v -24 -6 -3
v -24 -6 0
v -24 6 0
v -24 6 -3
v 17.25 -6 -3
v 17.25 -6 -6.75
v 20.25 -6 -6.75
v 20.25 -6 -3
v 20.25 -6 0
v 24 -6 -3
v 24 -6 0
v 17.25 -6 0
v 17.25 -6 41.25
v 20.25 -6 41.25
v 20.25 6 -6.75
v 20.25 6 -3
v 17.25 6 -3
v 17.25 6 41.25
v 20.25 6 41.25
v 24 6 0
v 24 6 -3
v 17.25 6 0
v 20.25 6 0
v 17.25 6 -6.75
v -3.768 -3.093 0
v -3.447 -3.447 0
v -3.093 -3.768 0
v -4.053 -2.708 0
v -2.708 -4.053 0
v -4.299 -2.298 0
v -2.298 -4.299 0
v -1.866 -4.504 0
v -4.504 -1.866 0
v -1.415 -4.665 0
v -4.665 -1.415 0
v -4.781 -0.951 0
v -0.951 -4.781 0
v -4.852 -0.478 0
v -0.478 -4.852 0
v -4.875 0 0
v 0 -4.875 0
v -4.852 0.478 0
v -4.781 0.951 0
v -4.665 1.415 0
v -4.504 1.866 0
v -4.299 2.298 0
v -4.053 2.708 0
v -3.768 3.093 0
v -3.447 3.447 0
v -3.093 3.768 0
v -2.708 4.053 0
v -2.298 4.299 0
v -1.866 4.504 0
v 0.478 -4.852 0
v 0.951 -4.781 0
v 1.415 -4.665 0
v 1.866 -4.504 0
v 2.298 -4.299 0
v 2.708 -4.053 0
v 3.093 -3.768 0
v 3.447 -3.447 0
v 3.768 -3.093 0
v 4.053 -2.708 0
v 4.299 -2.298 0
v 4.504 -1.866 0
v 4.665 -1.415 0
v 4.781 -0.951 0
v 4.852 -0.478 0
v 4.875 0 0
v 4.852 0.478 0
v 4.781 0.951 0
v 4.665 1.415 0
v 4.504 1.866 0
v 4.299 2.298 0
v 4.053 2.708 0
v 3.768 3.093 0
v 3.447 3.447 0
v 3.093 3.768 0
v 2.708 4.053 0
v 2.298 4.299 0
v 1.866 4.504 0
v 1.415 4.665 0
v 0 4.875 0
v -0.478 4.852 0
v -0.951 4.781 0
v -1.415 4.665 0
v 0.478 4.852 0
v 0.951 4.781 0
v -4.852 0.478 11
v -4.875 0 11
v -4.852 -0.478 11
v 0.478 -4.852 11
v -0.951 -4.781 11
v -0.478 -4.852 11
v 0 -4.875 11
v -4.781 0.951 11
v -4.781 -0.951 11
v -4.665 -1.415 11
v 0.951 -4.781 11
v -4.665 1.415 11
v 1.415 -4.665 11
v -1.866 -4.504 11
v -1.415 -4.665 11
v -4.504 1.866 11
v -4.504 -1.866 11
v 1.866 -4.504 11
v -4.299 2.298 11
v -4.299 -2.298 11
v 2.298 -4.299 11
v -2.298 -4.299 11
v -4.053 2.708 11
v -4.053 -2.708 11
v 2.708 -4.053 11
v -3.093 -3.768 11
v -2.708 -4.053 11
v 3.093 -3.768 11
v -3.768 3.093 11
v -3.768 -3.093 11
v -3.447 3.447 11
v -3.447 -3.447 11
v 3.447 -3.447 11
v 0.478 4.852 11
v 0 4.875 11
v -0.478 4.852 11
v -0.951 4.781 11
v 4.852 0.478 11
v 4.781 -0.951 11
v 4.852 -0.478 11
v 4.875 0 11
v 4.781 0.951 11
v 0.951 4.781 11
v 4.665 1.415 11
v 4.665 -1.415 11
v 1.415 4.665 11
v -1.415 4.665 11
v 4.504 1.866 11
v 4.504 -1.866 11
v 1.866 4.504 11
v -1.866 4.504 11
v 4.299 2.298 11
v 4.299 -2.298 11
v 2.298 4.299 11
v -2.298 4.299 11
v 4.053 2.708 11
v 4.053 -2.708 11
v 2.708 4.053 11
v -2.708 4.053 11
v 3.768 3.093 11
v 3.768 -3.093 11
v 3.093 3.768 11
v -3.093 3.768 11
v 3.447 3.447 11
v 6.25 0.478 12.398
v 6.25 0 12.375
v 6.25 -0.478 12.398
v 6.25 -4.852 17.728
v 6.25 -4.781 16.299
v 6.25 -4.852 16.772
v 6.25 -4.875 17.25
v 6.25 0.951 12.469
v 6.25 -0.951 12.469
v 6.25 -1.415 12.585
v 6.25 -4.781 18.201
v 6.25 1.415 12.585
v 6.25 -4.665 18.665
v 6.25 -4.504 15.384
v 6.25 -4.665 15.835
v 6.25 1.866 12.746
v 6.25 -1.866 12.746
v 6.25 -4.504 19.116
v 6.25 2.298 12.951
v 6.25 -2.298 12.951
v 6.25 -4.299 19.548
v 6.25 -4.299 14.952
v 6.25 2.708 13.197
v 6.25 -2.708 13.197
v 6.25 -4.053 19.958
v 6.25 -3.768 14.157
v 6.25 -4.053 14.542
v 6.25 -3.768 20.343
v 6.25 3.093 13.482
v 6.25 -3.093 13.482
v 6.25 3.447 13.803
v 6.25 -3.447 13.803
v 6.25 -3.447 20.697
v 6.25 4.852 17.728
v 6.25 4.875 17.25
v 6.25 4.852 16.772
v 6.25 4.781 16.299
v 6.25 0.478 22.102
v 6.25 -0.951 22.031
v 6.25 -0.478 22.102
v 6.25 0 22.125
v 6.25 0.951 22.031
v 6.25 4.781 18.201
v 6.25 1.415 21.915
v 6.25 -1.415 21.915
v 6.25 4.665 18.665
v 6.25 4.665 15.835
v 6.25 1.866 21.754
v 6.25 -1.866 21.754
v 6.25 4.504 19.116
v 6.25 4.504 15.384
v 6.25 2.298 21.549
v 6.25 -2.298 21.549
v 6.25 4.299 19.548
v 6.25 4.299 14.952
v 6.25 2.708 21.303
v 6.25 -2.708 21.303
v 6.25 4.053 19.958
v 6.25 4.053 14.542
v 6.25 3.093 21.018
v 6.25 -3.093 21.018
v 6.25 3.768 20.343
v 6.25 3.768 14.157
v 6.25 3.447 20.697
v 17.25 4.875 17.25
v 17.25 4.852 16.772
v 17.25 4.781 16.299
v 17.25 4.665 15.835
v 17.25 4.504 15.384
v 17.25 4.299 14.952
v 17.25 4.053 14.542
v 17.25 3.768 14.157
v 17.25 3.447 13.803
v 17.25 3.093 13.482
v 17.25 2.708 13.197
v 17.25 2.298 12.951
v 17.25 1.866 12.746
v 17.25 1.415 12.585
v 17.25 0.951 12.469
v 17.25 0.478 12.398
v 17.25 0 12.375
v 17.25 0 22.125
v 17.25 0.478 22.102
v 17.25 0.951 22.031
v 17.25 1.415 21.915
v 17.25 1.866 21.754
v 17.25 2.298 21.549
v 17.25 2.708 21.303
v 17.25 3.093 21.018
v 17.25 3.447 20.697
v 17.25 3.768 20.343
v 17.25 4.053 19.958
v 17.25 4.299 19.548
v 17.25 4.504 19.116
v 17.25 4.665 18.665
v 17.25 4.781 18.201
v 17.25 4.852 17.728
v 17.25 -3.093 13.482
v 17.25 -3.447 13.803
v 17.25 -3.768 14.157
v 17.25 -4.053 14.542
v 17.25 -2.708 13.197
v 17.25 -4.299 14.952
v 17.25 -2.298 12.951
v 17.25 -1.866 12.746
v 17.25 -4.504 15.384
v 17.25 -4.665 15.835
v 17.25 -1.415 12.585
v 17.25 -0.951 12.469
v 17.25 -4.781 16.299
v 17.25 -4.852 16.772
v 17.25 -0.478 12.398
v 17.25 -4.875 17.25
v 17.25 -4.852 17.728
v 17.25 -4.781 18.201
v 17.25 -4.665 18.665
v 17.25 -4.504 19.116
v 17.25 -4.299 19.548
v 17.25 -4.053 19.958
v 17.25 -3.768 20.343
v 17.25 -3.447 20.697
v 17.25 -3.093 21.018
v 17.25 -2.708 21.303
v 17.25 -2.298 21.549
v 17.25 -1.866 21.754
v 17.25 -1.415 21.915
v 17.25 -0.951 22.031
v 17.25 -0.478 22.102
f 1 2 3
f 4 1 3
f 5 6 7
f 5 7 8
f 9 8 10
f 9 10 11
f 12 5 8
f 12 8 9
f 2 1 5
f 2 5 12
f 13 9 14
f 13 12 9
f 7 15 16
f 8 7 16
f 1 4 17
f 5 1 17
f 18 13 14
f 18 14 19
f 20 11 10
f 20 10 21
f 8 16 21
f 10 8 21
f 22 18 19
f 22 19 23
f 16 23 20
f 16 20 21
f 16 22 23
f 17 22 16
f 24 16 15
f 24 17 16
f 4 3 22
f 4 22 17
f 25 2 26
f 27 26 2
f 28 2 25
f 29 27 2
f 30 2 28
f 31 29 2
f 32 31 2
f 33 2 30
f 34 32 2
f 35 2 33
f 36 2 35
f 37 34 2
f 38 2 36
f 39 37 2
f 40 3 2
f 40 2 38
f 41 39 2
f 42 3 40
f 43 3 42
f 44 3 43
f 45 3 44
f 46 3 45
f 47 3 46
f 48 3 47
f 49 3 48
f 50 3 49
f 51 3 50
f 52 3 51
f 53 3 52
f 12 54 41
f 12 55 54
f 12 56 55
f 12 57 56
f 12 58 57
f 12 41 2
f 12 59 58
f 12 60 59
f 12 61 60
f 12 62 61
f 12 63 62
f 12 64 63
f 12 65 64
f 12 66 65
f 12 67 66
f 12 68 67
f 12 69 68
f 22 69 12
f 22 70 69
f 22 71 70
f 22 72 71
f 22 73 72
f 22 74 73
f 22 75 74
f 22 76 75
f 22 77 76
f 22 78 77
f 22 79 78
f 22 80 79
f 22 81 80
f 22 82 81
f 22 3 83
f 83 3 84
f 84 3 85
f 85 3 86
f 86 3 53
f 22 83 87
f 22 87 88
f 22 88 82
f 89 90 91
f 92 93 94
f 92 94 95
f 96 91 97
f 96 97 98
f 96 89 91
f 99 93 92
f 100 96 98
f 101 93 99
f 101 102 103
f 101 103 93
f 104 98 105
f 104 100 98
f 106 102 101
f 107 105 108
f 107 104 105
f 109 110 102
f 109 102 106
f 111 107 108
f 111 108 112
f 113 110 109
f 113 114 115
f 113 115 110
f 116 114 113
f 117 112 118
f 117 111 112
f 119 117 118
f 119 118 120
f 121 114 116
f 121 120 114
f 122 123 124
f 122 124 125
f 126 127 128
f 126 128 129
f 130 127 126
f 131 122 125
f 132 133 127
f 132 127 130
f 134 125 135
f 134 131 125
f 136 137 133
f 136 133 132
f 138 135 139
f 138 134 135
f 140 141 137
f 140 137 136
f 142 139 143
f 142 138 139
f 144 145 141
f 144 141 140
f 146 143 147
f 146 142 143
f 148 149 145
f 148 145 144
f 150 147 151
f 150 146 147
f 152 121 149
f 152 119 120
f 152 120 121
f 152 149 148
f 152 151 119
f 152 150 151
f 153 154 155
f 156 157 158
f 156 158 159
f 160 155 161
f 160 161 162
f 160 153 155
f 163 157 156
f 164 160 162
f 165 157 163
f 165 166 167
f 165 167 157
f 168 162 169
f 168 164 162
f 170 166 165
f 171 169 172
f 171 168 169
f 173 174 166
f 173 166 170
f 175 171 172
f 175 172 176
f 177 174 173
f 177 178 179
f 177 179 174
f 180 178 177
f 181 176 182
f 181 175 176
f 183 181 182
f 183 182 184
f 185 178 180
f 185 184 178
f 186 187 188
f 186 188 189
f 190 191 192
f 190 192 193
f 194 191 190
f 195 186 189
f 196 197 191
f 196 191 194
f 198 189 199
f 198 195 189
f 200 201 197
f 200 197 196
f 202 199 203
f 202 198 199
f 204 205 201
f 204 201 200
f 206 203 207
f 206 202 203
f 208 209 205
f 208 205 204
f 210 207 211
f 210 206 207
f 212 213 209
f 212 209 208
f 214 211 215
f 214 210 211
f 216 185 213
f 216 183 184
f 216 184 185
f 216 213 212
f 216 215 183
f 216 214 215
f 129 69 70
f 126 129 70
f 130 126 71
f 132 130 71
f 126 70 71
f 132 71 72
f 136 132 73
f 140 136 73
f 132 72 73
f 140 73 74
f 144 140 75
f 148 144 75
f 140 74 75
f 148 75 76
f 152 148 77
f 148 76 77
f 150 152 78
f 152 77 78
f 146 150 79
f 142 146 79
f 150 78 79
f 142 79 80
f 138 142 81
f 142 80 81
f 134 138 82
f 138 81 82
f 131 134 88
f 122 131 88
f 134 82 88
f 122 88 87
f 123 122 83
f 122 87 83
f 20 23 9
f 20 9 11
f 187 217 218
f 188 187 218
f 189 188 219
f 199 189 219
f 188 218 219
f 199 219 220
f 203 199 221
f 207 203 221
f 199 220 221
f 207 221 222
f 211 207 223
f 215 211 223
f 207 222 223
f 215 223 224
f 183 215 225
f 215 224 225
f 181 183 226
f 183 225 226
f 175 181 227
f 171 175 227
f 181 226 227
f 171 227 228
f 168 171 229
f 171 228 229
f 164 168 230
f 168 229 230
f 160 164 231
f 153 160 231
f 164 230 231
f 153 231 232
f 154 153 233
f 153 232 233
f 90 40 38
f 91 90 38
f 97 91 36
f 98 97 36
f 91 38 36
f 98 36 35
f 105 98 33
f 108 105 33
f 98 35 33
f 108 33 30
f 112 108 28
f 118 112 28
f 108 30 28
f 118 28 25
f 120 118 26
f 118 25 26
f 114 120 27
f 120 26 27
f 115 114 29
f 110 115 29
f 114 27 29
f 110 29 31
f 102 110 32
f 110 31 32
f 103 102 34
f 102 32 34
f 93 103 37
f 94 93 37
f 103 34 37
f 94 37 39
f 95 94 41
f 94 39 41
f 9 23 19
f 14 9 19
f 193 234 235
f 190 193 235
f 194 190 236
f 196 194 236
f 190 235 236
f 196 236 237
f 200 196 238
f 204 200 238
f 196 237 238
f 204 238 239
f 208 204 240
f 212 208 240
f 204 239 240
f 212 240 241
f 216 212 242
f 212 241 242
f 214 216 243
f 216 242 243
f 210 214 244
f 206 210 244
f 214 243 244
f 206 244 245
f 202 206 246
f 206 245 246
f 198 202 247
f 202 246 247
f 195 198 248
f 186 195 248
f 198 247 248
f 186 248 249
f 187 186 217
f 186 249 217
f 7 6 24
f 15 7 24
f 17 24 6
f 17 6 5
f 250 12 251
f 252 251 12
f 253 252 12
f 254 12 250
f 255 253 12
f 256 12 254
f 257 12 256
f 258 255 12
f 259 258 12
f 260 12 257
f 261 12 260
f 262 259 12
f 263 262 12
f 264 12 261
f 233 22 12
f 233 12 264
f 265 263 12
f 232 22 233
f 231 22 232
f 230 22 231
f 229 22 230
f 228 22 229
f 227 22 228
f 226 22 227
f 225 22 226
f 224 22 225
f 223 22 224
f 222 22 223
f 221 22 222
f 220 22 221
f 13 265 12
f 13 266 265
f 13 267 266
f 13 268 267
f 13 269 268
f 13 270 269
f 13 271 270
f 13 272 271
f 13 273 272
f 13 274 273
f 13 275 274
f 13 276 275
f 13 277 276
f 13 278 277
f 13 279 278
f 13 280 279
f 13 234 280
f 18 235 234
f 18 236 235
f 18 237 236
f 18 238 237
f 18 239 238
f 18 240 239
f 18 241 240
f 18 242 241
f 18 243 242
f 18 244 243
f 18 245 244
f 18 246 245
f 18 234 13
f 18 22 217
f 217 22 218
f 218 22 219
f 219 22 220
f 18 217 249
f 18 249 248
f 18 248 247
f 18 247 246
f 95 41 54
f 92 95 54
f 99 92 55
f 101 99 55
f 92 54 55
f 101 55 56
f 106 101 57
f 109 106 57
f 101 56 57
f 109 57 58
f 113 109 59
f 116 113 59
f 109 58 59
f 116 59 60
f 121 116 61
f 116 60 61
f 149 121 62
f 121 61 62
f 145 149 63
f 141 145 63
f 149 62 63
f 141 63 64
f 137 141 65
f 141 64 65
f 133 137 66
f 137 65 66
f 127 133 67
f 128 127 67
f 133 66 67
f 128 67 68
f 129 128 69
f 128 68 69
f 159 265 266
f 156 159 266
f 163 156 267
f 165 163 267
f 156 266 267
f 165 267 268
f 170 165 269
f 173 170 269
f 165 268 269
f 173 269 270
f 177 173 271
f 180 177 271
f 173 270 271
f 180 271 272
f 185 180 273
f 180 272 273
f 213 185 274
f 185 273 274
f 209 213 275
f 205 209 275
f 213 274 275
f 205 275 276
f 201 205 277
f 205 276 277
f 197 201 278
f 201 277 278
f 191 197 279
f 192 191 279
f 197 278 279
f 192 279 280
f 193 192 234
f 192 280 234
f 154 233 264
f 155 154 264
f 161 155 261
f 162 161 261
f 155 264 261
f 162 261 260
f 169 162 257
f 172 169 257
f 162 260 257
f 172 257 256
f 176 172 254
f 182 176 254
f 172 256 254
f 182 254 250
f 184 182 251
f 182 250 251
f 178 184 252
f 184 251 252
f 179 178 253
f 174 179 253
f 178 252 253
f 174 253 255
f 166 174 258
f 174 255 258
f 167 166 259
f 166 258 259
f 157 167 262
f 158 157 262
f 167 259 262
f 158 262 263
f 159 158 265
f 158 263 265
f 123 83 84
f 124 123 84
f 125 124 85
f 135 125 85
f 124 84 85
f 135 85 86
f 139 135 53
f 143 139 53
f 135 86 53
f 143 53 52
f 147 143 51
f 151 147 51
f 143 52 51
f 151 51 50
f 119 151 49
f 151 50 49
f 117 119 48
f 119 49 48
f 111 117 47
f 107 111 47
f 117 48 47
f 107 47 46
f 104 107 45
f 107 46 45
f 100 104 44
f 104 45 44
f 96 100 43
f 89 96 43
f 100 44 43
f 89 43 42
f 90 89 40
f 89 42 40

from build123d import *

# Parameters (mm, degrees)
SKETCH1_W           = 48
SKETCH1_H           = 12
BOSS_EXTRUDE1_DEPTH = 3
SKETCH1_3_R         = 4.875
BOSS_EXTRUDE2_DEPTH = 11
CIRPATTERN2_COUNT   = 2
CIRPATTERN2_ANGLE   = 90


with BuildPart() as part:
    # Sketch1 → Boss-Extrude1 (new body)
    with BuildSketch(Plane.XY):
        Rectangle(SKETCH1_W, SKETCH1_H)
    boss_extrude1 = extrude(amount=-BOSS_EXTRUDE1_DEPTH)

    # Sketch1<3> → Boss-Extrude2 (add)
    with BuildSketch(Plane.XY):
        Circle(SKETCH1_3_R)
    boss_extrude2 = extrude(amount=BOSS_EXTRUDE2_DEPTH)

    # CirPattern2: Boss-Extrude1, Boss-Extrude2 ×2 about axis
    cirpattern2_axis = Axis((0, 55, 17.25), (0, -1, 0))
    add([boss_extrude1.rotate(cirpattern2_axis, i * CIRPATTERN2_ANGLE / (CIRPATTERN2_COUNT - 1)) for i in range(1, CIRPATTERN2_COUNT)])
    add([boss_extrude2.rotate(cirpattern2_axis, i * CIRPATTERN2_ANGLE / (CIRPATTERN2_COUNT - 1)) for i in range(1, CIRPATTERN2_COUNT)])


solid = part.part
